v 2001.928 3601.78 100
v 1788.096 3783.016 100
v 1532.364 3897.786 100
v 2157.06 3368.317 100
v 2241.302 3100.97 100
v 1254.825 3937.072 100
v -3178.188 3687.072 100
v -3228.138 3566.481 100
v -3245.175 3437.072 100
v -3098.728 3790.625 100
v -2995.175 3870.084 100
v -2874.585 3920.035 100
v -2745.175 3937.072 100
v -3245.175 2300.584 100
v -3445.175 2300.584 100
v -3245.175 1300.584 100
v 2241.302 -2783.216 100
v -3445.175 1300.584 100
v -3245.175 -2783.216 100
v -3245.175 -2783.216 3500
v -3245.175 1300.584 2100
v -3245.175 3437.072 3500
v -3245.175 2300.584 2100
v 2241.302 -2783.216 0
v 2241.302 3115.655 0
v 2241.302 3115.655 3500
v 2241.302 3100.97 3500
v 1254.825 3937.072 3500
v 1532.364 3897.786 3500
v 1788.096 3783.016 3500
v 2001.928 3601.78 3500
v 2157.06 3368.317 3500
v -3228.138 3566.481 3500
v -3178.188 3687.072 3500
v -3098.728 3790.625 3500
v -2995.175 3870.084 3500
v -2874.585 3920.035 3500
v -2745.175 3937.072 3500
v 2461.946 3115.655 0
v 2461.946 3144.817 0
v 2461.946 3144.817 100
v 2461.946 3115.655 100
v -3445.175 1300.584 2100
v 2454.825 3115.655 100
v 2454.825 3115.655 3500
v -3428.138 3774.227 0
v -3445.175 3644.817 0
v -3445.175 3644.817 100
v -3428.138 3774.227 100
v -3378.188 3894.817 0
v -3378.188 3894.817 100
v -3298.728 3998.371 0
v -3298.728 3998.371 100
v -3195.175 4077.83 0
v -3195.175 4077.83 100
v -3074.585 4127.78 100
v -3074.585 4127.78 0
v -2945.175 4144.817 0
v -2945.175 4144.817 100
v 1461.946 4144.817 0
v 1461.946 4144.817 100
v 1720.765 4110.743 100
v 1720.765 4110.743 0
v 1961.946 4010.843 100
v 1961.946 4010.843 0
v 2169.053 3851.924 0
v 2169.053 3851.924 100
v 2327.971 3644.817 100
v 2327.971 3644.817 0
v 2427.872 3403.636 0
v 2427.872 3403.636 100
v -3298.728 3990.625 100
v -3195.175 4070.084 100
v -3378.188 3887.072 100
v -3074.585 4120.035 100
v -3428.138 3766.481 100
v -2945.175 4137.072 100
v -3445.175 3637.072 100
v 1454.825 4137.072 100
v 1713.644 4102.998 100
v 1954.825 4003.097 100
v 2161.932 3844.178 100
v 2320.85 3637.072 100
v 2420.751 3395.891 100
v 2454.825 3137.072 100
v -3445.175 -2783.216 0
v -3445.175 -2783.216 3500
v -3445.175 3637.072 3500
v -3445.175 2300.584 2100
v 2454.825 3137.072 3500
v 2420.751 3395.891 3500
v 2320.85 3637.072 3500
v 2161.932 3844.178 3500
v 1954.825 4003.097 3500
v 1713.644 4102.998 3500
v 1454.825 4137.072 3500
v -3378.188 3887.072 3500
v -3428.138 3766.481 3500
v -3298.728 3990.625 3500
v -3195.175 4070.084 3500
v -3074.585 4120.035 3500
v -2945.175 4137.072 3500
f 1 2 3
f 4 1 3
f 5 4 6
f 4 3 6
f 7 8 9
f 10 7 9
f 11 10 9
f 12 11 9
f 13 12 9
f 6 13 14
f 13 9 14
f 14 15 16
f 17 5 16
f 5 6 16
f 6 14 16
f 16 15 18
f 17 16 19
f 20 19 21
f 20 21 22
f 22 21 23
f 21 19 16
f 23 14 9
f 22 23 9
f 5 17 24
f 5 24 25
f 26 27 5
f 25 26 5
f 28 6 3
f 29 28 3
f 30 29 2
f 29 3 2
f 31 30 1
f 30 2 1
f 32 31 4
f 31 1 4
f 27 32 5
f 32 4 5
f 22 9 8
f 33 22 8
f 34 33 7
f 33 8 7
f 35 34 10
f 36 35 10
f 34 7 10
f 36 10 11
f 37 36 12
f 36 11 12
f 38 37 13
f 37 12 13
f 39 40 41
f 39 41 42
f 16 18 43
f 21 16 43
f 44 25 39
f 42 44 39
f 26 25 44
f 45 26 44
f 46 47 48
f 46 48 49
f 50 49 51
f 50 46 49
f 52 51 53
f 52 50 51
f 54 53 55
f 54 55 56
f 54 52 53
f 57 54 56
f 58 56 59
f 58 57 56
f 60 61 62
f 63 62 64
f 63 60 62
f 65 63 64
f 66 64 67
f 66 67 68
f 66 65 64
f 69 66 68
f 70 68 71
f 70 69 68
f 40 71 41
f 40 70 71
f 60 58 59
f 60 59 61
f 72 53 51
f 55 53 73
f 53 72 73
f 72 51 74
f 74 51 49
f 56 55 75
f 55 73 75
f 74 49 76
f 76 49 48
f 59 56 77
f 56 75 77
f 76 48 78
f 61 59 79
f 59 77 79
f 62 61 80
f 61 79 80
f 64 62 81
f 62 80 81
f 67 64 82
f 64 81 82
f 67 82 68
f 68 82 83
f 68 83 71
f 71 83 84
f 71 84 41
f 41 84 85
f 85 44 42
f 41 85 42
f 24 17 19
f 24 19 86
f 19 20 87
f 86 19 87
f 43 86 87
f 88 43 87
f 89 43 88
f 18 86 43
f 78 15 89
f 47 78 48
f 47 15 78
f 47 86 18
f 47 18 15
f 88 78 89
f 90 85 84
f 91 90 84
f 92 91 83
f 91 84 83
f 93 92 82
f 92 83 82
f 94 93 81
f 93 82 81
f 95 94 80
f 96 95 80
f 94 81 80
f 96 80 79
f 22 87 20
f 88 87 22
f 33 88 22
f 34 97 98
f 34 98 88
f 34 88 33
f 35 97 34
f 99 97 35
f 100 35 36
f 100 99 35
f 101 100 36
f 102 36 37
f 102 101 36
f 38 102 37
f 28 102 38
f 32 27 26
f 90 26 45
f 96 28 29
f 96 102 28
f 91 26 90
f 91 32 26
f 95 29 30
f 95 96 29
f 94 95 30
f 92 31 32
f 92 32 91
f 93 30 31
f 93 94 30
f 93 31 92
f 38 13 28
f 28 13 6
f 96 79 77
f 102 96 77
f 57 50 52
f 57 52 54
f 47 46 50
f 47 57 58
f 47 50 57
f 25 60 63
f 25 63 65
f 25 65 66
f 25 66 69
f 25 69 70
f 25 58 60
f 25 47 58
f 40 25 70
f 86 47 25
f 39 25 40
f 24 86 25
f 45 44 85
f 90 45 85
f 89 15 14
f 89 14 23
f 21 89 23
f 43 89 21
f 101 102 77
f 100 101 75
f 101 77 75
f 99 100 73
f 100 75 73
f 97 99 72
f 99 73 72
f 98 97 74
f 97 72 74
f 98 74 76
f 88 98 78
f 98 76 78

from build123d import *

# Parameters (mm, degrees)
F1_DEPTH = 3500
F3_DEPTH = 100
F4_W     = 1000
F4_H     = 2000
F5_DEPTH = 560
F6_W     = 417.586803
F6_H     = 5898.871898
F7_DEPTH = 3610


with BuildPart() as f1:
    # F0 (on Top) → F1 (new body)
    with BuildSketch(Plane.XY):
        with BuildLine():
            Line((1454.825001, 4137.071715), (-2945.174999, 4137.071715))
            ThreePointArc((-2945.174999, 4137.071715), (-3298.72839, 3990.625105), (-3445.174999, 3637.071715))
            Line((-3445.174999, 3637.071715), (-3445.174999, -3012.928285))
            Line((-3445.174999, -3012.928285), (2454.825001, -3012.928285))
            Line((2454.825001, -3012.928285), (2454.825001, 3137.071715))
            ThreePointArc((2454.825001, 3137.071715), (2161.931782, 3844.178496), (1454.825001, 4137.071715))
        make_face()
        with BuildLine():
            ThreePointArc((-3245.174999, 3437.071715), (-3098.72839, 3790.625105), (-2745.174999, 3937.071715))
            Line((-2745.174999, 3937.071715), (1254.825001, 3937.071715))
            ThreePointArc((1254.825001, 3937.071715), (1961.931782, 3644.178496), (2254.825001, 2937.071715))
            Line((2254.825001, 2937.071715), (2254.825001, -2812.928285))
            Line((2254.825001, -2812.928285), (-3245.174999, -2812.928285))
            Line((-3245.174999, -2812.928285), (-3245.174999, 3437.071715))
        make_face(mode=Mode.SUBTRACT)
    extrude(amount=F1_DEPTH)

    # F2 (on face) → F3 (join)
    with BuildSketch(Plane(origin=(0, 0, 0), x_dir=(1, 0, 0), z_dir=(0, 0, -1))):
        with BuildLine():
            Line((2461.945772, 3012.928285), (-3445.174999, 3012.928285))
            Line((-3445.174999, 3012.928285), (-3445.174999, -3644.817352))
            ThreePointArc((-3445.174999, -3644.817352), (-3298.72839, -3998.370743), (-2945.174999, -4144.817352))
            Line((-2945.174999, -4144.817352), (1461.945772, -4144.817352))
            ThreePointArc((1461.945772, -4144.817352), (2169.052553, -3851.924133), (2461.945772, -3144.817352))
            Line((2461.945772, -3144.817352), (2461.945772, 3012.928285))
        make_face()
    extrude(amount=-F3_DEPTH)

    # F4 (on face) → F5 (cut)
    with BuildSketch(Plane(origin=(-3445.174999, 0, 0), x_dir=(0, -1, 0), z_dir=(-1, 0, 0))):
        with Locations((-1800.583731, 1100)):
            Rectangle(F4_W, F4_H)
    extrude(amount=-F5_DEPTH, mode=Mode.SUBTRACT)

    # F6 (on face) → F7 (cut)
    with BuildSketch(Plane.XY.offset(3500)):
        Polygon((2241.302252, -2783.216476), (-3555.570841, -2783.216476), (-3555.570841, -3383.711338), (2658.889055, -3383.711338), (2658.889055, -2783.216476), align=None)
        with Locations((2450.095654, 166.219473)):
            Rectangle(F6_W, F6_H)
    extrude(amount=-F7_DEPTH, mode=Mode.SUBTRACT)


solid = f1.part
